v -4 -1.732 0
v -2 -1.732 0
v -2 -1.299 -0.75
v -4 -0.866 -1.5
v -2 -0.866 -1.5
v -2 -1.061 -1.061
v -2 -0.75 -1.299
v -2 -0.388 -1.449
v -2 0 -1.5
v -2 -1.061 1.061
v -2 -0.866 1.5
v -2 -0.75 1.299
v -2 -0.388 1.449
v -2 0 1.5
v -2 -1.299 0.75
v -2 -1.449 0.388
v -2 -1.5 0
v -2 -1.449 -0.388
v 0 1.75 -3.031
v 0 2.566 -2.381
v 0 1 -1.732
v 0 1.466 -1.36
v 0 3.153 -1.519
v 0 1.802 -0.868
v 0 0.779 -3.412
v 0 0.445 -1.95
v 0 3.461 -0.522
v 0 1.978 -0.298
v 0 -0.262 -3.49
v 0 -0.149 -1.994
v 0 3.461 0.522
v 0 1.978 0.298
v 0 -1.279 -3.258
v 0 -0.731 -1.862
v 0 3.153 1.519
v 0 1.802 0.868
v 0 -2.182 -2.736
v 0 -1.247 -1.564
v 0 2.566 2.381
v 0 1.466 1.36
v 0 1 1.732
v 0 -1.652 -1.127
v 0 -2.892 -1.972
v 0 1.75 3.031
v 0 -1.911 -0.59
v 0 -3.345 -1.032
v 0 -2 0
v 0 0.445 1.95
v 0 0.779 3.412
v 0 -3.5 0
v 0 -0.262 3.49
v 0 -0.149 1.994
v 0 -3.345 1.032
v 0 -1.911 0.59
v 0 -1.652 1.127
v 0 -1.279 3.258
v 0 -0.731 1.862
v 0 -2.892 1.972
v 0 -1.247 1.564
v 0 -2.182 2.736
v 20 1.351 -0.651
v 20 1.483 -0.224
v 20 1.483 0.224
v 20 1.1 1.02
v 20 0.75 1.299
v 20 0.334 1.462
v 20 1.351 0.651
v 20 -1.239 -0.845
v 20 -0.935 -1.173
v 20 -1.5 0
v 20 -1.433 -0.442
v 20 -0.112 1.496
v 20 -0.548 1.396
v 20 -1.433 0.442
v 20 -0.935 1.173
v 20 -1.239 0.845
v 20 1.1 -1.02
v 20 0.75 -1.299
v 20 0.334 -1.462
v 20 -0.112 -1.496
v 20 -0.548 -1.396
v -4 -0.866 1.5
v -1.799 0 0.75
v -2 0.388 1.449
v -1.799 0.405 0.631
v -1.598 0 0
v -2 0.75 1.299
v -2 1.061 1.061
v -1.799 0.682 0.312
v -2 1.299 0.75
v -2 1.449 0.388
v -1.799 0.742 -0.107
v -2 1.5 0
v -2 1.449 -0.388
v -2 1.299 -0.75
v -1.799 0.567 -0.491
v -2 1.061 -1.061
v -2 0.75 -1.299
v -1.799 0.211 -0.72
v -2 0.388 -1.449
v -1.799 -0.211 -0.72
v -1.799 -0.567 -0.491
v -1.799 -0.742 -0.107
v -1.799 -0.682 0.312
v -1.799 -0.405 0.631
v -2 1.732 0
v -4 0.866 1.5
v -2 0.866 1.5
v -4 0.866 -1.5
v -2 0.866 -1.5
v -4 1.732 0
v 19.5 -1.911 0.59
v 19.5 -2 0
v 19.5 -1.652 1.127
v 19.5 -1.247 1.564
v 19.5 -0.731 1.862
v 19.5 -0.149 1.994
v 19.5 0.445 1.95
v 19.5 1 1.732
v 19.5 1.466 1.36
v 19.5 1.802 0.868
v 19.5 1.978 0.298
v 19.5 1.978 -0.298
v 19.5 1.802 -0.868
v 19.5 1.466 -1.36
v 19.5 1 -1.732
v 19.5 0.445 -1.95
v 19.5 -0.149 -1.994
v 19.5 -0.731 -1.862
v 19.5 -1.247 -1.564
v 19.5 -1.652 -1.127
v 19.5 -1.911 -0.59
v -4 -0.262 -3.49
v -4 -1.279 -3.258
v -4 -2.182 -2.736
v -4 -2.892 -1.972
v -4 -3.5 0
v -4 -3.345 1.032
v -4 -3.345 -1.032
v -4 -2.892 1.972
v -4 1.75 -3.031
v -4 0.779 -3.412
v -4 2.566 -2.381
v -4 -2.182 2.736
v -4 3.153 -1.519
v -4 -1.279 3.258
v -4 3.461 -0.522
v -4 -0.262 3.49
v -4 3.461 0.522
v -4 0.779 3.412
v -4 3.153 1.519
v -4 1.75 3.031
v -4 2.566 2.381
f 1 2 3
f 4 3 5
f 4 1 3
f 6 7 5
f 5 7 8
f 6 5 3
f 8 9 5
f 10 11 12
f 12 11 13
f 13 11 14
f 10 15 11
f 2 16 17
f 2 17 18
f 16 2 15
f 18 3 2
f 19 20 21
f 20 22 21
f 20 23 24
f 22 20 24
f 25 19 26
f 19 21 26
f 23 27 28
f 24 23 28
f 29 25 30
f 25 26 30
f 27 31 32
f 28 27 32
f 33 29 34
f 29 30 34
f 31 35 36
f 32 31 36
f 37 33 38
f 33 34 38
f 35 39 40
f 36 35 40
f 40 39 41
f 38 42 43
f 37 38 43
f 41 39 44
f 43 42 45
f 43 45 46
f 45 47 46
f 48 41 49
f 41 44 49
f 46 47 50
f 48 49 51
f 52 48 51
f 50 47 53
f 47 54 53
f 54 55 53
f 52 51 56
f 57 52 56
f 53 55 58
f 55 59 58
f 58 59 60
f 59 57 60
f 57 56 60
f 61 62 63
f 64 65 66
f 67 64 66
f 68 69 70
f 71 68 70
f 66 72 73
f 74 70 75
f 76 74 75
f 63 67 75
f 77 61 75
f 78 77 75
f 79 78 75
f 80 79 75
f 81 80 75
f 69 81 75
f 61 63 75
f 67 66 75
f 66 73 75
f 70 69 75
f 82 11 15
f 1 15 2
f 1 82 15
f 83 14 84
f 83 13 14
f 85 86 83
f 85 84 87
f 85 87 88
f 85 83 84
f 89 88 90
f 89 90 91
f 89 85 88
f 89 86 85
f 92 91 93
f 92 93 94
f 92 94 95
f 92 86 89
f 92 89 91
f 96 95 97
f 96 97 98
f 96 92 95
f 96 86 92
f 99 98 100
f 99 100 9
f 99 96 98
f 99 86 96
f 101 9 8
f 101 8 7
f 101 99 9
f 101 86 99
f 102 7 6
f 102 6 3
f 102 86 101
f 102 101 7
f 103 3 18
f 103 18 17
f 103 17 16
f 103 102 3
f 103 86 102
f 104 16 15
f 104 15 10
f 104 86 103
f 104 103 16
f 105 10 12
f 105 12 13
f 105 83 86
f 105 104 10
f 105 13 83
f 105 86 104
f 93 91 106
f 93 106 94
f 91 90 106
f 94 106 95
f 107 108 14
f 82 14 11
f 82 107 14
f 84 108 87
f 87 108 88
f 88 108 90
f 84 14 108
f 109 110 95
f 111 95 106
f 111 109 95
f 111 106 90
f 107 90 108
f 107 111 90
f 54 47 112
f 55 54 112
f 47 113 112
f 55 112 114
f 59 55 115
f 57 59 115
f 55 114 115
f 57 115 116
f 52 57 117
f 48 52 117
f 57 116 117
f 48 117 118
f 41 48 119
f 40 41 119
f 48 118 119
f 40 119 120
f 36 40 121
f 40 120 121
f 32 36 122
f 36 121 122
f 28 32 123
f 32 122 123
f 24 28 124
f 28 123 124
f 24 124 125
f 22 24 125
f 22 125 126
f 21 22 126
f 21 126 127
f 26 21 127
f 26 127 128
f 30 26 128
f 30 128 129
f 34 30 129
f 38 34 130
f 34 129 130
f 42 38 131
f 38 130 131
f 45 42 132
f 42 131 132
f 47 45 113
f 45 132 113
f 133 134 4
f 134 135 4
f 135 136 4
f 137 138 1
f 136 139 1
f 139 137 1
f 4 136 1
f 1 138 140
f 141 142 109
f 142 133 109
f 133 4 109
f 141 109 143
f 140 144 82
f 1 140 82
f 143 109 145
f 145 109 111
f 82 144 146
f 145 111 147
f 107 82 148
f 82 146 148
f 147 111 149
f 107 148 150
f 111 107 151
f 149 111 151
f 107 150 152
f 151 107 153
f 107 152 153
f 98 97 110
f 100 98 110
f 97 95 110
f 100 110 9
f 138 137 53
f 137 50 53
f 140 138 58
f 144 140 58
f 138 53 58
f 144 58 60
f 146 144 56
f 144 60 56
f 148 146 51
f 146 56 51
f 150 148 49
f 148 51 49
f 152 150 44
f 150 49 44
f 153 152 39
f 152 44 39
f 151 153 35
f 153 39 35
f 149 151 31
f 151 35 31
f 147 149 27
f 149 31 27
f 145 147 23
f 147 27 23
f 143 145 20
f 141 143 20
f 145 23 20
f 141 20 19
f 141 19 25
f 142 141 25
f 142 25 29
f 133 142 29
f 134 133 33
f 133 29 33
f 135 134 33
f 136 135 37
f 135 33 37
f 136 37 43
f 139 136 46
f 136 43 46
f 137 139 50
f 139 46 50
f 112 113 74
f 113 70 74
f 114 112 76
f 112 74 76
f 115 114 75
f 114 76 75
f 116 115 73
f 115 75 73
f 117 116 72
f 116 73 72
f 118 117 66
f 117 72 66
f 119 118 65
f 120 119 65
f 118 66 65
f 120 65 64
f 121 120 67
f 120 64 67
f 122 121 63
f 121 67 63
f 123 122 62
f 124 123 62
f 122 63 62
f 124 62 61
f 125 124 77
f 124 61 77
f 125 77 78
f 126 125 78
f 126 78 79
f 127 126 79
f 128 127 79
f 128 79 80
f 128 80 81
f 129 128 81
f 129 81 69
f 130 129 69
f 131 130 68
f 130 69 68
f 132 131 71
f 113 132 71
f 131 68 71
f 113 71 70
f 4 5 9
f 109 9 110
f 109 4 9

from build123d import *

# Parameters (mm, degrees)
CUT_EXTRUDE_1_DEPTH = 2


with BuildPart() as part:
    # 草圖1 → 旋轉1 (revolve)
    with BuildSketch(Plane.XY):
        Polygon((-4, 0), (-4, 3.5), (0, 3.5), (0, 2), (19.5, 2), (20, 1.5), (20, 0), align=None)
    revolve(axis=Axis((20, 0, 0), (-1, 0, 0)))

    # 草圖2 → 除料-旋轉1 (revolve, cut)
    with BuildSketch(Plane.XY):
        Polygon((-4, 0), (-4, 1.5), (-2, 1.5), (-1.598076211, 0), align=None)
    revolve(axis=Axis((-1.598076211, 0, 0), (-1, 0, 0)), mode=Mode.SUBTRACT)

    # 草圖3 → 除料-伸長1 (cut)
    with BuildSketch(Plane(origin=(-4, 0, 0), x_dir=(0, 0, -1), z_dir=(1, 0, 0))):
        Polygon((-1.5, 0.866025404), (-1.5, -0.866025404), (0, -1.732050808), (1.5, -0.866025404), (1.5, 0.866025404), (0, 1.732050808), align=None)
    extrude(amount=CUT_EXTRUDE_1_DEPTH, mode=Mode.SUBTRACT)


solid = part.part
